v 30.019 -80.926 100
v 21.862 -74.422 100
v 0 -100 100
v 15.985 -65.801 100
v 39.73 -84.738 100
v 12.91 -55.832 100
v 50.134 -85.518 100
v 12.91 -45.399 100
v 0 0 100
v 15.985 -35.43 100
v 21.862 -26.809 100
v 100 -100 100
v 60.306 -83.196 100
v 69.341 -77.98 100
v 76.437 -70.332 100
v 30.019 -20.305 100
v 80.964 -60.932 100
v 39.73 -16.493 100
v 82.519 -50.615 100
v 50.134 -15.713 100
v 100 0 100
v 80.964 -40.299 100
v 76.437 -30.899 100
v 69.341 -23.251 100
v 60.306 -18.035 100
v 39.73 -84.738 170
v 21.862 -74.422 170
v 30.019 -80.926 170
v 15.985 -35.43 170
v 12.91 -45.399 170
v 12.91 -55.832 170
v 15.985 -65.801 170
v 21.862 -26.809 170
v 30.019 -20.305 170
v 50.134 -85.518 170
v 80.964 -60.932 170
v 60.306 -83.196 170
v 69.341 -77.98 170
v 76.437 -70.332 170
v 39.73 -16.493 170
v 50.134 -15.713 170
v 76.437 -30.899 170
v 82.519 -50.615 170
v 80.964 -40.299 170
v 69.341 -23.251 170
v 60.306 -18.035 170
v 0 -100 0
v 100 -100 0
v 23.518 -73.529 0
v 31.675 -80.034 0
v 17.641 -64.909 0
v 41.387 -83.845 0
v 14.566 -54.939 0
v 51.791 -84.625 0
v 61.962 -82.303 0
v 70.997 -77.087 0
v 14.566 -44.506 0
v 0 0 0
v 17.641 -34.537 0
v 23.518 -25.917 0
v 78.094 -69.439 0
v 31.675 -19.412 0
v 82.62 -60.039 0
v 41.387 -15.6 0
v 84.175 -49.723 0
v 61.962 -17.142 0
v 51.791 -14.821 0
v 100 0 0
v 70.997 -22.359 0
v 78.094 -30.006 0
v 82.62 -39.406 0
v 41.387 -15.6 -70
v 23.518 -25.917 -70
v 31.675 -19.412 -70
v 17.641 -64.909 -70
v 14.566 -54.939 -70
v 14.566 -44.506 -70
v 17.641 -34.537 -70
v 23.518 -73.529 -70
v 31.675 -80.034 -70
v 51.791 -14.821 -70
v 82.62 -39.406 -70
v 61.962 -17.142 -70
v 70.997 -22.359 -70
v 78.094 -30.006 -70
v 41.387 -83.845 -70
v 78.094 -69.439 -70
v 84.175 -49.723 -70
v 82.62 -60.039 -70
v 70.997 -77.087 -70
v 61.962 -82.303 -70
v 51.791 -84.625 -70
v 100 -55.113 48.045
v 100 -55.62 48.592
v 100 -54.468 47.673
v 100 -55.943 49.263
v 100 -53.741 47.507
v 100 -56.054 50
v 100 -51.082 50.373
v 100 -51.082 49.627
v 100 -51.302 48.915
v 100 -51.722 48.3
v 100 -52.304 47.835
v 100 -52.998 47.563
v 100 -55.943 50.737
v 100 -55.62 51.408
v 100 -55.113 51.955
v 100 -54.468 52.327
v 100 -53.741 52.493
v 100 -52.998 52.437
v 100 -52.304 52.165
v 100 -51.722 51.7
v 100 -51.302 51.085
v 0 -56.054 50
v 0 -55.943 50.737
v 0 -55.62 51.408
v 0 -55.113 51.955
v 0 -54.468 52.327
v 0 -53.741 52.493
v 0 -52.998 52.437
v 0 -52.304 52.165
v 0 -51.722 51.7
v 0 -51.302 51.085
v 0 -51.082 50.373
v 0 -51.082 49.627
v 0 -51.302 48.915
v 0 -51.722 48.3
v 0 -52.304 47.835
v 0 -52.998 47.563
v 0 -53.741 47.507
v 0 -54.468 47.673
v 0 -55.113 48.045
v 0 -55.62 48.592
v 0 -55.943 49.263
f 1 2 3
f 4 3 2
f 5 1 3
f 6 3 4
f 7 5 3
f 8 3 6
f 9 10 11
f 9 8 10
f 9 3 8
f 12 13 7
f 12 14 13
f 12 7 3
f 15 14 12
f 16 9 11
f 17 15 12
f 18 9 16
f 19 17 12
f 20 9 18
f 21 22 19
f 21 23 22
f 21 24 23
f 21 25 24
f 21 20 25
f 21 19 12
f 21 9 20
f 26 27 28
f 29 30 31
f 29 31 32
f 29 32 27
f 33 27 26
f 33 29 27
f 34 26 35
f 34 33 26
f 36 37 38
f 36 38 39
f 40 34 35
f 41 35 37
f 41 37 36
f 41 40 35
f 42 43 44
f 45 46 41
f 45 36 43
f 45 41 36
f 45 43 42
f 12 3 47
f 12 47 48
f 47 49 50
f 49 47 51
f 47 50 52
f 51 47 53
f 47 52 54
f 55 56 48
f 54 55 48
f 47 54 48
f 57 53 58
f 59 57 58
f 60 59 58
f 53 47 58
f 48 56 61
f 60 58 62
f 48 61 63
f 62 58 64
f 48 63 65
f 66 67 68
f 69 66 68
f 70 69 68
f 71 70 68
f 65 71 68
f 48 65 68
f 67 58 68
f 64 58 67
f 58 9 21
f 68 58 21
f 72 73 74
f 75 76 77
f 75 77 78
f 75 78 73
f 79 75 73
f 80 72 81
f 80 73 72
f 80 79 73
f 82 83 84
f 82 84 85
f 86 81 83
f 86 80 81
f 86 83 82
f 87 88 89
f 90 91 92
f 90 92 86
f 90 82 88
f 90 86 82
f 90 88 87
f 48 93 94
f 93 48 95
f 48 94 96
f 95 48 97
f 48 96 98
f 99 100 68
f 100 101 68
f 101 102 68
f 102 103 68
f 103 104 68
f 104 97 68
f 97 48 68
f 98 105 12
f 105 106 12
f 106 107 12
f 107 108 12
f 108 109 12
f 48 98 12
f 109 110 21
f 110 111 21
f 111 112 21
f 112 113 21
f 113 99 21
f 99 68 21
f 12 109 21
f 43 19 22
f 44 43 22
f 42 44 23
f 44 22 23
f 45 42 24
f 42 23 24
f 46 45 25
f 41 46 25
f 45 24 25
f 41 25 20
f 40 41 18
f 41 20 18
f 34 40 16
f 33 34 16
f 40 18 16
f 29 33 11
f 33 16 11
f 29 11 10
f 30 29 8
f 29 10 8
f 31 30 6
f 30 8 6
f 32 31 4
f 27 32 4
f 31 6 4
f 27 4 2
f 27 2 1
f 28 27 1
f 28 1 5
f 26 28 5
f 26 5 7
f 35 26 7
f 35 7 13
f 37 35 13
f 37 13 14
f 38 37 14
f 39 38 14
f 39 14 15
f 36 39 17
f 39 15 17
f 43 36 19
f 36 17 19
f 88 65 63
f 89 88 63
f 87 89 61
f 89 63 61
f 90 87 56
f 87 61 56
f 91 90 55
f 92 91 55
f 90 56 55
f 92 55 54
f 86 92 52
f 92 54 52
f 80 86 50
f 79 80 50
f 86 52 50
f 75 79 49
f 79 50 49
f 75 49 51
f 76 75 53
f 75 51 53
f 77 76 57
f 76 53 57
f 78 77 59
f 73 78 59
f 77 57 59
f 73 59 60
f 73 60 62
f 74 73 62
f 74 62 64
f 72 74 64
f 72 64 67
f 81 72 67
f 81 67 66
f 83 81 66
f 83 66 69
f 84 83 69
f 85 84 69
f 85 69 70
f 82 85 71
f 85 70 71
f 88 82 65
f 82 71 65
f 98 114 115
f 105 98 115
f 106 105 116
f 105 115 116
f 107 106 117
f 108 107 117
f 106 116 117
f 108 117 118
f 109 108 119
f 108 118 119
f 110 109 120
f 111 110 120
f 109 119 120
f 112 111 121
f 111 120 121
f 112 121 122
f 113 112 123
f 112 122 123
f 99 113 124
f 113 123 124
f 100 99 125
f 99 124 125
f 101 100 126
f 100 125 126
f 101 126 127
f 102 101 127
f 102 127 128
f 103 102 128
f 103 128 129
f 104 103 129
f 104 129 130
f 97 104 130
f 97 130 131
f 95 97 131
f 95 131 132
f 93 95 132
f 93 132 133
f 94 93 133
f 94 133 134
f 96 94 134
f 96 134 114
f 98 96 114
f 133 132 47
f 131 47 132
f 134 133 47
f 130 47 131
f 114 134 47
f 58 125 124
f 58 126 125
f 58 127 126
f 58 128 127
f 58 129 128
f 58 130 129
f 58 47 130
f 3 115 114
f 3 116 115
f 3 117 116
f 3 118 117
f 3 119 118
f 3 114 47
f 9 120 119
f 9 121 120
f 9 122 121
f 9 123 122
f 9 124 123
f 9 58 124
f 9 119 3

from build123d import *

# Parameters (mm, degrees)
F0_W     = 100
F0_H     = 100
F1_DEPTH = 100
F2_R     = 35
F3_DEPTH = 70
F4_R     = 35
F5_DEPTH = 70
F7_D     = 5


with BuildPart() as f1:
    # F0 (on Front) → F1 (new body)
    with BuildSketch(Plane.XZ):
        with Locations((50, 50)):
            Rectangle(F0_W, F0_H)
    extrude(amount=F1_DEPTH)

    # F2 (on face) → F3 (join)
    with BuildSketch(Plane.XY.offset(100)):
        with Locations((47.518581, -50.615475)):
            Circle(F2_R)
    extrude(amount=F3_DEPTH)

    # F4 (on face) → F5 (join)
    with BuildSketch(Plane(origin=(0, 0, 0), x_dir=(1, 0, 0), z_dir=(0, 0, -1))):
        with Locations((49.175262, 49.722657)):
            Circle(F4_R)
    extrude(amount=F5_DEPTH)

    # F7 (through all)
    with Locations(Plane.YZ.offset(100)):
        with Locations((-53.554386, 50)):
            Hole(F7_D / 2)


solid = f1.part
